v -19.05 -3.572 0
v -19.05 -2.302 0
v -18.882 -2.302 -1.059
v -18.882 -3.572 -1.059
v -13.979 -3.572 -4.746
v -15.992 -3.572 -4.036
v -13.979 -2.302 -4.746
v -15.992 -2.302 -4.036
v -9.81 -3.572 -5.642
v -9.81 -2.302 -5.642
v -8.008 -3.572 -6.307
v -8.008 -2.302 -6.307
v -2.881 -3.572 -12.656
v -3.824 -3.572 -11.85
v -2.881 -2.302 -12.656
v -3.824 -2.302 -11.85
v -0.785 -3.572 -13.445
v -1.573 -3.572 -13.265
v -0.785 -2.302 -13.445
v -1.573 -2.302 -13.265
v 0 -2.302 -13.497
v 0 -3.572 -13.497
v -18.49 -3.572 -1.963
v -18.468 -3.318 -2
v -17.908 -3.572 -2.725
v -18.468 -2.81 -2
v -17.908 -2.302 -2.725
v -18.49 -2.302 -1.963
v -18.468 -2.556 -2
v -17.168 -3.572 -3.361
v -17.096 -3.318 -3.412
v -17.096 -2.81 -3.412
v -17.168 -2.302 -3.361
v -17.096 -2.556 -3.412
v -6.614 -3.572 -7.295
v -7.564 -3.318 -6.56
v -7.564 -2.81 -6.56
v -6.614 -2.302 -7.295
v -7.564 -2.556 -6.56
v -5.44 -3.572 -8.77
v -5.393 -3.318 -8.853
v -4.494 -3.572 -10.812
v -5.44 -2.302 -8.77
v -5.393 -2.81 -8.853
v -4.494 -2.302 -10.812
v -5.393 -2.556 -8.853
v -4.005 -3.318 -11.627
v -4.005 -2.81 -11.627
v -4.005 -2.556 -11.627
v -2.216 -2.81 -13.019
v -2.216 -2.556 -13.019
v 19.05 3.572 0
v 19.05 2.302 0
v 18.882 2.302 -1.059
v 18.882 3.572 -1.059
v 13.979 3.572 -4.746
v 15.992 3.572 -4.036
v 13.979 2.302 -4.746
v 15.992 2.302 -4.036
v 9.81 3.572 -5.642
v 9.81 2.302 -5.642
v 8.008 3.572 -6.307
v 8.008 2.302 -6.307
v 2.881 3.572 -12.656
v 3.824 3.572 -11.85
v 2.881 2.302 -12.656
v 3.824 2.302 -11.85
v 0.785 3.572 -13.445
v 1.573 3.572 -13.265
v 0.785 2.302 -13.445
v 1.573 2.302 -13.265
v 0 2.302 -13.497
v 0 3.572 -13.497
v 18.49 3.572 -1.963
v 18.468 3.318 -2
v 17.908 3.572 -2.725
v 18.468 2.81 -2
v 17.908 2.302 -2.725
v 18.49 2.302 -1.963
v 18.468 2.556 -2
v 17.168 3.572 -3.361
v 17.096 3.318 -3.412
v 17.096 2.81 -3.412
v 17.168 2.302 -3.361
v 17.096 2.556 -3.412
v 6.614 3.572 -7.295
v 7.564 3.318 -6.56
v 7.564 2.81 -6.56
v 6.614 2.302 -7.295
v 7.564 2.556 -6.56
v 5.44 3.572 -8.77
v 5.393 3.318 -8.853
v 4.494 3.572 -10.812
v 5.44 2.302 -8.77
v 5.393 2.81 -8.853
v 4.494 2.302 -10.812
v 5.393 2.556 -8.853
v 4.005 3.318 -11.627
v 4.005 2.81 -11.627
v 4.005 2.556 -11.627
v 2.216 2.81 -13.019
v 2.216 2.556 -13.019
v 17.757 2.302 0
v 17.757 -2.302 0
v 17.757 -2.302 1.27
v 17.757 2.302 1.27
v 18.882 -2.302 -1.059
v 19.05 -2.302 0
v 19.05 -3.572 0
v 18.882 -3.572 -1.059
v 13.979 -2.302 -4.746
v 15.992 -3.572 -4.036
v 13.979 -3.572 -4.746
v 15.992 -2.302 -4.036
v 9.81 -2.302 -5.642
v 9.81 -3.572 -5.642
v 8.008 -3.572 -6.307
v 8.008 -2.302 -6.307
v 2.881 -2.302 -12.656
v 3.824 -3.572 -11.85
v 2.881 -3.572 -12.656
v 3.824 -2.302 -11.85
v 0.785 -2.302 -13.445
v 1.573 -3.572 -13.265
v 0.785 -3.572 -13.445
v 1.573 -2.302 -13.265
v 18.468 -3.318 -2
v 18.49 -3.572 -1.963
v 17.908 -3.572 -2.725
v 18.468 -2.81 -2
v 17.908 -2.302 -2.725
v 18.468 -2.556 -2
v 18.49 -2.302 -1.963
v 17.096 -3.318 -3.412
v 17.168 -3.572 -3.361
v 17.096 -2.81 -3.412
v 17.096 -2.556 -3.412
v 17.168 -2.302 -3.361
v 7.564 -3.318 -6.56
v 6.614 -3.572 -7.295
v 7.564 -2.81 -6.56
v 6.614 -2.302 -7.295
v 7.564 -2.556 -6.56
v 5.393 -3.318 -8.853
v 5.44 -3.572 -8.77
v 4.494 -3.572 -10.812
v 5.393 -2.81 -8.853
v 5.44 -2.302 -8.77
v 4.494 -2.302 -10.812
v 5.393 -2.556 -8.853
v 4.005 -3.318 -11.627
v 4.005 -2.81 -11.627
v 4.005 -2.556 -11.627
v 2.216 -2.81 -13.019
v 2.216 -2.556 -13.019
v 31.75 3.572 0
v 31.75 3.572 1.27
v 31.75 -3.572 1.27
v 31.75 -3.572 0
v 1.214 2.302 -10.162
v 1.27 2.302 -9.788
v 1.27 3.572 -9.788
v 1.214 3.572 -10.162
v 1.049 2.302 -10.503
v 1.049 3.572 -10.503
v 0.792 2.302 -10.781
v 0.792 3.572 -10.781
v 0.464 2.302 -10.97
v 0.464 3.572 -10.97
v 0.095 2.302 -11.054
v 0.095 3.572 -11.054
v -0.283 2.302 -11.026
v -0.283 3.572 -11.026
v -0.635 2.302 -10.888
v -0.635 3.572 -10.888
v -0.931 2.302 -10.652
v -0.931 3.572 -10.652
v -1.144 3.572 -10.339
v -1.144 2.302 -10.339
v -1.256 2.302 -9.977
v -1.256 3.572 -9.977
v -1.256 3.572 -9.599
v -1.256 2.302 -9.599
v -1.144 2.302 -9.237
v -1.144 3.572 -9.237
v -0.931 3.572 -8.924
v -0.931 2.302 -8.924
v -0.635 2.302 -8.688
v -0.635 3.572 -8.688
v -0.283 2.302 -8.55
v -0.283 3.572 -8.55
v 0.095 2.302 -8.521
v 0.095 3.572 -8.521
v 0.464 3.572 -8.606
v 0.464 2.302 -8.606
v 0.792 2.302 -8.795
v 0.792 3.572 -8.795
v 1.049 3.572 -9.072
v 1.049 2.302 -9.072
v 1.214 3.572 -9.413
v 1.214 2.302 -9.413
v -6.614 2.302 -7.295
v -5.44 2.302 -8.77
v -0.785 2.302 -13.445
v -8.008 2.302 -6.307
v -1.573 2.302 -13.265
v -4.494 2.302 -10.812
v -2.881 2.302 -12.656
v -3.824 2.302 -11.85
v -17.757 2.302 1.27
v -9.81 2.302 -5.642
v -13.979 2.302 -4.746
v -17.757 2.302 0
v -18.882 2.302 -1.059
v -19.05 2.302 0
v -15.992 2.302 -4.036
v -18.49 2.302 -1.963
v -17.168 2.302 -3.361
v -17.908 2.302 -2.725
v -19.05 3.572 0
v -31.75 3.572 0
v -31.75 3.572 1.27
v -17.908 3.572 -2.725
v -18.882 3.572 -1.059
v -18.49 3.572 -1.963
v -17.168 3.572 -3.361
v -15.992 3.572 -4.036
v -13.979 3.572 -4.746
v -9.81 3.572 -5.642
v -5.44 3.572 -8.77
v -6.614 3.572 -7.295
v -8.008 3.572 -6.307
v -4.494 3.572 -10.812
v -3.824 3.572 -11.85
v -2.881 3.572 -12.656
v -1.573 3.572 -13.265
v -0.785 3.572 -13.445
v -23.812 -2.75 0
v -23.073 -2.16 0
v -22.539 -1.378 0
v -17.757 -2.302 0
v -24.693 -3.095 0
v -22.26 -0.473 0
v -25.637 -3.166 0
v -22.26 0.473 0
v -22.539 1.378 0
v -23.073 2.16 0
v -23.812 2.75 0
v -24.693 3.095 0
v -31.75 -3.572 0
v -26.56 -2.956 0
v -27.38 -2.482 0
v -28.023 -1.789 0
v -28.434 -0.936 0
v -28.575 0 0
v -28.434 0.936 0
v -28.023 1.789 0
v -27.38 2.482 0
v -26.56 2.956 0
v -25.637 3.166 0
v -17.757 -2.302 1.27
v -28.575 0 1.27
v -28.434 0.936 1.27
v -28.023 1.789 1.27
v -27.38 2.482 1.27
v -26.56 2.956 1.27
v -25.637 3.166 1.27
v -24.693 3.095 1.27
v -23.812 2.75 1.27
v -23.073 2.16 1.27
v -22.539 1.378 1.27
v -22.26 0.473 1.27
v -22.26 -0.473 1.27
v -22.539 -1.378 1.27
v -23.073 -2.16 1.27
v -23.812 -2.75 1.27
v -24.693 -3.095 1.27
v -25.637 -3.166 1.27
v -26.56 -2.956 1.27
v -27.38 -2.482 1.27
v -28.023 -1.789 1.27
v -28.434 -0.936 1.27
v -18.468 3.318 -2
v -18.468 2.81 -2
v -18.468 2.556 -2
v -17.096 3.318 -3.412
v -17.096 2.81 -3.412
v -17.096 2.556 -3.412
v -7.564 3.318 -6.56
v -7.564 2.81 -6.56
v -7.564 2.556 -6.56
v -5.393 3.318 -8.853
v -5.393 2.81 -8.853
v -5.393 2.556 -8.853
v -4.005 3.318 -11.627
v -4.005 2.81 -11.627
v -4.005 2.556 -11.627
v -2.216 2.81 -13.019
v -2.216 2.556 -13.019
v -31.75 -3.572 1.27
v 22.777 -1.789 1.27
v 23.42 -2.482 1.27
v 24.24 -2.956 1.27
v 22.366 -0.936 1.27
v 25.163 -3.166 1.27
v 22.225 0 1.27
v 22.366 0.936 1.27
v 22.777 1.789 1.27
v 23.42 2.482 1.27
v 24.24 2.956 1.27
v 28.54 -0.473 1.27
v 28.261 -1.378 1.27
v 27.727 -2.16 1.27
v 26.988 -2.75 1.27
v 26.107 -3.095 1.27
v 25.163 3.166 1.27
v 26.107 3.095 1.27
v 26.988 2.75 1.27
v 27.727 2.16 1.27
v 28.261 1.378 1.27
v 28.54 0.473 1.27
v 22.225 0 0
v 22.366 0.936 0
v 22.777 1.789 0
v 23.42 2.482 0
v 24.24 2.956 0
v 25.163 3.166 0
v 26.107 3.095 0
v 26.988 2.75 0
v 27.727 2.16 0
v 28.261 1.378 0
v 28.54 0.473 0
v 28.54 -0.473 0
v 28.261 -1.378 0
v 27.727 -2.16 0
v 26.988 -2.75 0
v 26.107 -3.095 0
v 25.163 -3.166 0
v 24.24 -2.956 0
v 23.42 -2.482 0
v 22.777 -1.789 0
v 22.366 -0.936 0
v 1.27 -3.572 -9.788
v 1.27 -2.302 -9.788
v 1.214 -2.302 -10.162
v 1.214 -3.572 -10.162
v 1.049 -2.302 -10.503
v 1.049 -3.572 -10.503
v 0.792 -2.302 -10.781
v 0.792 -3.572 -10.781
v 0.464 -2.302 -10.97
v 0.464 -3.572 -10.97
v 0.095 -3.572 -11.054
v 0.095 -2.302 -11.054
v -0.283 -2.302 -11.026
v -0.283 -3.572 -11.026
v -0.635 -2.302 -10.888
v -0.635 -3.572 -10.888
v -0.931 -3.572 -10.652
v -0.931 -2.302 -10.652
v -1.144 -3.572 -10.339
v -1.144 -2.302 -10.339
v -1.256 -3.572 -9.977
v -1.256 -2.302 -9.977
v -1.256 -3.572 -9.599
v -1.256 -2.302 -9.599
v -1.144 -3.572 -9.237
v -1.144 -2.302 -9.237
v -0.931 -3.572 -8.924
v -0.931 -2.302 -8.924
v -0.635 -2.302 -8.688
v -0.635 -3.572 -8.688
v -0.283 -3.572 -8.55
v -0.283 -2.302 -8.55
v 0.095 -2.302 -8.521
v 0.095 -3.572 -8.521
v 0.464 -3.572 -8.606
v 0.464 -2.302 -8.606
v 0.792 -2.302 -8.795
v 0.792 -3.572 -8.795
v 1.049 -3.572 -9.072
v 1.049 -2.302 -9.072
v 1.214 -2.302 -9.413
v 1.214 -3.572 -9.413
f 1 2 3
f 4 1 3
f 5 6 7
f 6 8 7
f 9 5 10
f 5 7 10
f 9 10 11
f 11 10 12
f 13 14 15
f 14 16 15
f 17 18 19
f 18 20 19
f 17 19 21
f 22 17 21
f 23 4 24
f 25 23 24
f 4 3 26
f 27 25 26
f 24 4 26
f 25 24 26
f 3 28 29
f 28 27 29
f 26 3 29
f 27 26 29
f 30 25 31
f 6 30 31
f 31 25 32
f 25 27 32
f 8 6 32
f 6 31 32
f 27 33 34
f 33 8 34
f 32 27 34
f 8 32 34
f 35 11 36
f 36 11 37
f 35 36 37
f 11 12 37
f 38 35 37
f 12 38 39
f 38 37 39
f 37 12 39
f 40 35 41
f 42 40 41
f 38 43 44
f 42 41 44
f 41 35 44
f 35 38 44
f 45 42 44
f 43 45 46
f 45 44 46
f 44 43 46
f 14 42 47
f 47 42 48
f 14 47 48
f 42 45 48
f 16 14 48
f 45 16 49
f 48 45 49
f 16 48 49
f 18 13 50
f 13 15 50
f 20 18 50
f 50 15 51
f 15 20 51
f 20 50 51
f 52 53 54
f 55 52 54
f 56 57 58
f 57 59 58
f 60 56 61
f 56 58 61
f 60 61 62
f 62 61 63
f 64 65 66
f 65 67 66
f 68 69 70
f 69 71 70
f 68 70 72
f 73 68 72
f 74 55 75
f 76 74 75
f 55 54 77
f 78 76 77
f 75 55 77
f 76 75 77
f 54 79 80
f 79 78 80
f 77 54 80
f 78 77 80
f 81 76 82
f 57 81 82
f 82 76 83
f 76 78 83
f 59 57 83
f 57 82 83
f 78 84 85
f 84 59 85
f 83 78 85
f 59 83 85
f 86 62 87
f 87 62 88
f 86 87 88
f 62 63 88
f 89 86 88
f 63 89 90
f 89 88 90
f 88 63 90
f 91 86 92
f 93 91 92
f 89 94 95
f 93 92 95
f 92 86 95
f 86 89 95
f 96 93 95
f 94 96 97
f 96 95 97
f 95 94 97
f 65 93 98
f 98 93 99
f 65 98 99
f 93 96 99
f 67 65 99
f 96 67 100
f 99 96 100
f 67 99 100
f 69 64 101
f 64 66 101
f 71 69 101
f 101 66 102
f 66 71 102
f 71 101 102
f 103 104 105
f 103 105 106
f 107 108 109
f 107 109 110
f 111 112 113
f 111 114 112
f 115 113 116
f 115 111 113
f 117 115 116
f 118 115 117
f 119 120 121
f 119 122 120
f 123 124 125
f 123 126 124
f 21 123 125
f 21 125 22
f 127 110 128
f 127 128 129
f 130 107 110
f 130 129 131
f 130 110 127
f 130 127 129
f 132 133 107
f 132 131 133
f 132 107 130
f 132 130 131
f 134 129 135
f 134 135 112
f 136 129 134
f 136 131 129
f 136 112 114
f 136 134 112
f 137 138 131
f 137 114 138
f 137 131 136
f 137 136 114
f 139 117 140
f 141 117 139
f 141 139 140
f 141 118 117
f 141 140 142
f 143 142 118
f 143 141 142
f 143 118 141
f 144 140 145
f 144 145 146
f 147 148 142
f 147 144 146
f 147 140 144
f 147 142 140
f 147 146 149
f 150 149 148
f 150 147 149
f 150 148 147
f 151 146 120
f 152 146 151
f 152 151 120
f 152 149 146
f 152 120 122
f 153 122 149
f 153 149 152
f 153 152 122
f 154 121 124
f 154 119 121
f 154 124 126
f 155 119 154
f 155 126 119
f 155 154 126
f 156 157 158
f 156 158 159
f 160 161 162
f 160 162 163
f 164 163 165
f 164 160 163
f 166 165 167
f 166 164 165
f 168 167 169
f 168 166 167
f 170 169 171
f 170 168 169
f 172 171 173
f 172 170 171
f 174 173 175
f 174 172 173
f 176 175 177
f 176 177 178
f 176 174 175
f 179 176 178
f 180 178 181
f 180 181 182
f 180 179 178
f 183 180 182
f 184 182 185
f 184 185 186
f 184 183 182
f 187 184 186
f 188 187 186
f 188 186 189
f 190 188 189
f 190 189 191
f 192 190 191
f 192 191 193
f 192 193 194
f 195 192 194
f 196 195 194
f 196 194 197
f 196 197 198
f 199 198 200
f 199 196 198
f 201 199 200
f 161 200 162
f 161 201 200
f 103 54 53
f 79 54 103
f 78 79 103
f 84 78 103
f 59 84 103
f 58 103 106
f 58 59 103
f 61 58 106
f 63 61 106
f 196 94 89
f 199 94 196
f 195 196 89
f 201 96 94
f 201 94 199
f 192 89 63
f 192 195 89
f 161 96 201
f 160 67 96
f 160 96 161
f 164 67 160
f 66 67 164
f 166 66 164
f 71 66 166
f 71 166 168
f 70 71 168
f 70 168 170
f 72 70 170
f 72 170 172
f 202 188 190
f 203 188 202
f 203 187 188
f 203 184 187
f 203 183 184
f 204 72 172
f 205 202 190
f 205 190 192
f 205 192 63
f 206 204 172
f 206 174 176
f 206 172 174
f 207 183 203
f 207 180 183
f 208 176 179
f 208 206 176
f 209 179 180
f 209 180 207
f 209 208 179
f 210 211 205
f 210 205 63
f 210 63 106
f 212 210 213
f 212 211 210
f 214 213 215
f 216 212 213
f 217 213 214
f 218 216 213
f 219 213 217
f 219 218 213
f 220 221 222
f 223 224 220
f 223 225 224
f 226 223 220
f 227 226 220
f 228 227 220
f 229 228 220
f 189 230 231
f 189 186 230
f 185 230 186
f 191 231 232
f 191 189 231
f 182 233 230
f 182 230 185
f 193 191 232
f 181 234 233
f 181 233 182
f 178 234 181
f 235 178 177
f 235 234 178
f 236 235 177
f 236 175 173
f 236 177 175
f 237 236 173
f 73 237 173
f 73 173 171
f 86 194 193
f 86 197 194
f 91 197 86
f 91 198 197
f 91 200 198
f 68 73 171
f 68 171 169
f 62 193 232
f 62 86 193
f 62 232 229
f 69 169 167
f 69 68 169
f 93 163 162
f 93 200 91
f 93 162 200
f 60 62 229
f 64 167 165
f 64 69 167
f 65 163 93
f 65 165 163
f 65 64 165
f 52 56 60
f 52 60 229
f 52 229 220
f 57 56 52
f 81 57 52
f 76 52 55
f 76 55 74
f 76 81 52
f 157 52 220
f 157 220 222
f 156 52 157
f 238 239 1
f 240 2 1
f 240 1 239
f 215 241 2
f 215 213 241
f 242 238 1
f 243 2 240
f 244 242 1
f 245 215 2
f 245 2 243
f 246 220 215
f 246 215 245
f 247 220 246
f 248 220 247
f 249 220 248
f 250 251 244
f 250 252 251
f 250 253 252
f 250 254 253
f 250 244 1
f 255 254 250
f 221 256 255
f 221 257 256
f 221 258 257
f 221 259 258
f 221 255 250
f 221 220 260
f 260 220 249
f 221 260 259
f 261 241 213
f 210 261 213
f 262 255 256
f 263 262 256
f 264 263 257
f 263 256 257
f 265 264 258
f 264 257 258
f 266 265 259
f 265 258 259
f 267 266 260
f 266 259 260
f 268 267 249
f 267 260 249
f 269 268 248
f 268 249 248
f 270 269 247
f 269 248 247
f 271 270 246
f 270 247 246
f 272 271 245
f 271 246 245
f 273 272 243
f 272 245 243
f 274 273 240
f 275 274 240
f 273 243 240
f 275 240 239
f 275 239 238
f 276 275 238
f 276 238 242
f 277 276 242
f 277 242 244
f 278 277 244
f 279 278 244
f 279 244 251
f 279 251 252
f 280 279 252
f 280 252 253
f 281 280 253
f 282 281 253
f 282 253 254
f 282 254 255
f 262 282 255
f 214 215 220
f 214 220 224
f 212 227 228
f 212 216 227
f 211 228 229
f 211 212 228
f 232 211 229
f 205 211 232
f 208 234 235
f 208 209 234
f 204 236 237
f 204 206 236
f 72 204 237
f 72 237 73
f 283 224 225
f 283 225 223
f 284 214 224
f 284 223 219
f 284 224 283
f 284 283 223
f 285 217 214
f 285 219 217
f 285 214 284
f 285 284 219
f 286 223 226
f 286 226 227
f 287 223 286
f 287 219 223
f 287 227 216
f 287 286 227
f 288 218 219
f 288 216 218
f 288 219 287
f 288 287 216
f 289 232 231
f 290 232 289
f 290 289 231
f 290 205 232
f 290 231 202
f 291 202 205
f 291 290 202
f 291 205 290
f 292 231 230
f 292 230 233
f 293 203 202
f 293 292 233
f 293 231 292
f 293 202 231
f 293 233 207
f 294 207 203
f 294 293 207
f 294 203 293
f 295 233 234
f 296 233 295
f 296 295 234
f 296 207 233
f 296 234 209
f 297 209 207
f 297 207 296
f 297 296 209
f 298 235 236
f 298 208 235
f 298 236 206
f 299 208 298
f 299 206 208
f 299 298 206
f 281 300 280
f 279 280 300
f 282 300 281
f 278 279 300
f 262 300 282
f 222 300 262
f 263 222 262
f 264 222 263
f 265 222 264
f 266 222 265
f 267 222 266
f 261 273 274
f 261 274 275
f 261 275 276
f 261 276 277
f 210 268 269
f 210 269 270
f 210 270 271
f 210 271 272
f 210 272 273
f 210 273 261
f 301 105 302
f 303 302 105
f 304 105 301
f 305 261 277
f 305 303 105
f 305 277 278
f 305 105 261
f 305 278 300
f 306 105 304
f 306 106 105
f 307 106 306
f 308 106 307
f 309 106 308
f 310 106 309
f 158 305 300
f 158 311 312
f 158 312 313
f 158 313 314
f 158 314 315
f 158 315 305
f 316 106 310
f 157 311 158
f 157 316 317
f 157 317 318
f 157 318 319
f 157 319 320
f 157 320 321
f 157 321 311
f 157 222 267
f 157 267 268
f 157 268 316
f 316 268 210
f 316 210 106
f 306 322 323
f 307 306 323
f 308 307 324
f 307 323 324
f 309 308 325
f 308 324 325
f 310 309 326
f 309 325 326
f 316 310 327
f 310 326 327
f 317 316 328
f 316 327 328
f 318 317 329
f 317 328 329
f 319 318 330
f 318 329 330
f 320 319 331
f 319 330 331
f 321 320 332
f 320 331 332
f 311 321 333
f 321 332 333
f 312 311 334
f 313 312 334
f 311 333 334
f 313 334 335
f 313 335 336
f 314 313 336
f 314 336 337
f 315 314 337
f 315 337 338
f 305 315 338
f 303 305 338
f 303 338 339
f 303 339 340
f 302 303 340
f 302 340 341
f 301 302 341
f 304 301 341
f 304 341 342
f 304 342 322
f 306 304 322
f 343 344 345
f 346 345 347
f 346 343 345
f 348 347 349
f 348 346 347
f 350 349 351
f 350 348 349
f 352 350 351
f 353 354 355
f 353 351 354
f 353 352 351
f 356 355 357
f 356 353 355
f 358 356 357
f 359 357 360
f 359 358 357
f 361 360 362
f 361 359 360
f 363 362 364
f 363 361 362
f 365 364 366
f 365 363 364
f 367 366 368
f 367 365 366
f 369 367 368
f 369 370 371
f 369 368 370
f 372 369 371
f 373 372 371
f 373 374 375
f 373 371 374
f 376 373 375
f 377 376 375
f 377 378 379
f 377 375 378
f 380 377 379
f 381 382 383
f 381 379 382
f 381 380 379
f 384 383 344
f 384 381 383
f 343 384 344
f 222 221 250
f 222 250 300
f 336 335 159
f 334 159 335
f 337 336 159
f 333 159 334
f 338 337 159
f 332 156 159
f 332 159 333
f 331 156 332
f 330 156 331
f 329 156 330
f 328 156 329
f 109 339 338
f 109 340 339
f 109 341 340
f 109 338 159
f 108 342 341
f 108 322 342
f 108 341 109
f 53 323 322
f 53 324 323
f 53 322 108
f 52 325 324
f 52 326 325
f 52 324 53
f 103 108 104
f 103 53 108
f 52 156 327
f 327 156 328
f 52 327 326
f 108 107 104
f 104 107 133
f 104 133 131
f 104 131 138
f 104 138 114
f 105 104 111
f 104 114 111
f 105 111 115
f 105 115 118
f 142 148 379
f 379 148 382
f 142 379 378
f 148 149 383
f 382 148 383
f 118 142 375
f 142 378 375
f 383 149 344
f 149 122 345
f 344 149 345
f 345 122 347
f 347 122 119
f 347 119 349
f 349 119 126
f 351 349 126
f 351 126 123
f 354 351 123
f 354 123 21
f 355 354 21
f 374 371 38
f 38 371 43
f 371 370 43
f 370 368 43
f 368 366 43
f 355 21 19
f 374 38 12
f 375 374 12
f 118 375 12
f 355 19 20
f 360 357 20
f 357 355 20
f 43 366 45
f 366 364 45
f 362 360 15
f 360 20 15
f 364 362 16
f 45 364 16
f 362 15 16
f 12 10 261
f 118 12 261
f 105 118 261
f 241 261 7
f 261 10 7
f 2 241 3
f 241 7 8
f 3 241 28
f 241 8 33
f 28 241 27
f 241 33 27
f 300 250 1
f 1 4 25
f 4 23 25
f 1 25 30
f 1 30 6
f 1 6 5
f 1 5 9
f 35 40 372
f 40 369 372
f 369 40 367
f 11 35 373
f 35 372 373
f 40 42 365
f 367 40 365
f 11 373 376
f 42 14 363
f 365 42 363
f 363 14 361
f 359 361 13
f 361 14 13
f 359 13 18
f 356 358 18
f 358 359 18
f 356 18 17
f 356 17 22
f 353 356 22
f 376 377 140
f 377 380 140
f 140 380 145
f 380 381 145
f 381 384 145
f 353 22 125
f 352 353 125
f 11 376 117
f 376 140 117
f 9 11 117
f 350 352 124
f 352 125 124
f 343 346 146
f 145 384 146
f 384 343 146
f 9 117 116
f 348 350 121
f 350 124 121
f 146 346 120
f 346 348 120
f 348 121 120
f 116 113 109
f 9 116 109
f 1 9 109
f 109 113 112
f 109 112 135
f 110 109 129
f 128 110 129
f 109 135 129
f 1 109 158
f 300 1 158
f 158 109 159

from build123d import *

# Parameters (mm, degrees)
SKETCH2_R           = 1.27
BOSS_EXTRUDE1_DEPTH = 3.571875
SKETCH2_3_R         = 1.27
CUT_EXTRUDE1_DEPTH  = 2.301875
SKETCH3_R           = 3.175
SKETCH3_W           = 35.514246082
SKETCH3_H           = 4.60375
CUT_EXTRUDE2_DEPTH  = 4.60375


with BuildPart() as part:
    # Sketch2 → Boss-Extrude1 (new, symmetric)
    with BuildSketch(Plane(origin=(0, 0, 0), x_dir=(1, 0, 0), z_dir=(0, 1, 0))):
        with BuildLine():
            Line((-19.05, 0), (-31.75, 0))
            Line((-31.75, 0), (-31.75, -1.27))
            Line((-31.75, -1.27), (31.75, -1.27))
            Line((31.75, -1.27), (31.75, 0))
            Line((31.75, 0), (19.05, 0))
            add(Edge.make_bspline(
                [(19.05, 0), (18.924950207, 3.11249949), (13.871376527, 5.182684851), (8.100418146, 5.640691885), (5.150487062, 8.710773905), (4.233787006, 12.334614196), (1.464765989, 13.525214321), (0, 13.497480559)],
                knots=[0, 0, 0, 0, 0.332448712, 0.564615599, 0.691987457, 0.817131748, 1, 1, 1, 1], degree=3))
            add(Edge.make_bspline(
                [(-19.05, 0), (-18.924950207, 3.11249949), (-13.871376527, 5.182684851), (-8.100418146, 5.640691885), (-5.150487062, 8.710773905), (-4.233787006, 12.334614196), (-1.464765989, 13.525214321), (0, 13.497480559)],
                knots=[0, 0, 0, 0, 0.332448712, 0.564615599, 0.691987457, 0.817131748, 1, 1, 1, 1], degree=3))
        make_face()
        with Locations((0, 9.787802422)):
            Circle(SKETCH2_R, mode=Mode.SUBTRACT)
    extrude(amount=BOSS_EXTRUDE1_DEPTH, both=True)

    # Sketch2<3> → Cut-Extrude1 (cut, symmetric)
    with BuildSketch(Plane(origin=(0, 0, 0), x_dir=(1, 0, 0), z_dir=(0, 1, 0))):
        with BuildLine():
            add(Edge.make_bspline(
                [(-19.05, 0), (-18.924950207, 3.11249949), (-13.871376527, 5.182684851), (-8.100418146, 5.640691885), (-5.150487062, 8.710773905), (-4.233787006, 12.334614196), (-1.464765989, 13.525214321), (0, 13.497480559)],
                knots=[0, 0, 0, 0, 0.332448712, 0.564615599, 0.691987457, 0.817131748, 1, 1, 1, 1], degree=3))
            Line((-19.05, 0), (19.05, 0))
            add(Edge.make_bspline(
                [(19.05, 0), (18.924950207, 3.11249949), (13.871376527, 5.182684851), (8.100418146, 5.640691885), (5.150487062, 8.710773905), (4.233787006, 12.334614196), (1.464765989, 13.525214321), (0, 13.497480559)],
                knots=[0, 0, 0, 0, 0.332448712, 0.564615599, 0.691987457, 0.817131748, 1, 1, 1, 1], degree=3))
        make_face()
        with Locations((0, 9.787802422)):
            Circle(SKETCH2_3_R, mode=Mode.SUBTRACT)
    extrude(amount=CUT_EXTRUDE1_DEPTH, both=True, mode=Mode.SUBTRACT)

    # Sketch3 → Cut-Extrude2 (cut)
    with BuildSketch(Plane(origin=(0, 0, 0), x_dir=(-1, 0, 0), z_dir=(0, 0, -1))):
        with Locations((-25.4, 0)):
            Circle(SKETCH3_R)
        with Locations((25.4, 0)):
            Circle(SKETCH3_R)
        Rectangle(SKETCH3_W, SKETCH3_H)
    extrude(amount=-CUT_EXTRUDE2_DEPTH, mode=Mode.SUBTRACT)


solid = part.part
